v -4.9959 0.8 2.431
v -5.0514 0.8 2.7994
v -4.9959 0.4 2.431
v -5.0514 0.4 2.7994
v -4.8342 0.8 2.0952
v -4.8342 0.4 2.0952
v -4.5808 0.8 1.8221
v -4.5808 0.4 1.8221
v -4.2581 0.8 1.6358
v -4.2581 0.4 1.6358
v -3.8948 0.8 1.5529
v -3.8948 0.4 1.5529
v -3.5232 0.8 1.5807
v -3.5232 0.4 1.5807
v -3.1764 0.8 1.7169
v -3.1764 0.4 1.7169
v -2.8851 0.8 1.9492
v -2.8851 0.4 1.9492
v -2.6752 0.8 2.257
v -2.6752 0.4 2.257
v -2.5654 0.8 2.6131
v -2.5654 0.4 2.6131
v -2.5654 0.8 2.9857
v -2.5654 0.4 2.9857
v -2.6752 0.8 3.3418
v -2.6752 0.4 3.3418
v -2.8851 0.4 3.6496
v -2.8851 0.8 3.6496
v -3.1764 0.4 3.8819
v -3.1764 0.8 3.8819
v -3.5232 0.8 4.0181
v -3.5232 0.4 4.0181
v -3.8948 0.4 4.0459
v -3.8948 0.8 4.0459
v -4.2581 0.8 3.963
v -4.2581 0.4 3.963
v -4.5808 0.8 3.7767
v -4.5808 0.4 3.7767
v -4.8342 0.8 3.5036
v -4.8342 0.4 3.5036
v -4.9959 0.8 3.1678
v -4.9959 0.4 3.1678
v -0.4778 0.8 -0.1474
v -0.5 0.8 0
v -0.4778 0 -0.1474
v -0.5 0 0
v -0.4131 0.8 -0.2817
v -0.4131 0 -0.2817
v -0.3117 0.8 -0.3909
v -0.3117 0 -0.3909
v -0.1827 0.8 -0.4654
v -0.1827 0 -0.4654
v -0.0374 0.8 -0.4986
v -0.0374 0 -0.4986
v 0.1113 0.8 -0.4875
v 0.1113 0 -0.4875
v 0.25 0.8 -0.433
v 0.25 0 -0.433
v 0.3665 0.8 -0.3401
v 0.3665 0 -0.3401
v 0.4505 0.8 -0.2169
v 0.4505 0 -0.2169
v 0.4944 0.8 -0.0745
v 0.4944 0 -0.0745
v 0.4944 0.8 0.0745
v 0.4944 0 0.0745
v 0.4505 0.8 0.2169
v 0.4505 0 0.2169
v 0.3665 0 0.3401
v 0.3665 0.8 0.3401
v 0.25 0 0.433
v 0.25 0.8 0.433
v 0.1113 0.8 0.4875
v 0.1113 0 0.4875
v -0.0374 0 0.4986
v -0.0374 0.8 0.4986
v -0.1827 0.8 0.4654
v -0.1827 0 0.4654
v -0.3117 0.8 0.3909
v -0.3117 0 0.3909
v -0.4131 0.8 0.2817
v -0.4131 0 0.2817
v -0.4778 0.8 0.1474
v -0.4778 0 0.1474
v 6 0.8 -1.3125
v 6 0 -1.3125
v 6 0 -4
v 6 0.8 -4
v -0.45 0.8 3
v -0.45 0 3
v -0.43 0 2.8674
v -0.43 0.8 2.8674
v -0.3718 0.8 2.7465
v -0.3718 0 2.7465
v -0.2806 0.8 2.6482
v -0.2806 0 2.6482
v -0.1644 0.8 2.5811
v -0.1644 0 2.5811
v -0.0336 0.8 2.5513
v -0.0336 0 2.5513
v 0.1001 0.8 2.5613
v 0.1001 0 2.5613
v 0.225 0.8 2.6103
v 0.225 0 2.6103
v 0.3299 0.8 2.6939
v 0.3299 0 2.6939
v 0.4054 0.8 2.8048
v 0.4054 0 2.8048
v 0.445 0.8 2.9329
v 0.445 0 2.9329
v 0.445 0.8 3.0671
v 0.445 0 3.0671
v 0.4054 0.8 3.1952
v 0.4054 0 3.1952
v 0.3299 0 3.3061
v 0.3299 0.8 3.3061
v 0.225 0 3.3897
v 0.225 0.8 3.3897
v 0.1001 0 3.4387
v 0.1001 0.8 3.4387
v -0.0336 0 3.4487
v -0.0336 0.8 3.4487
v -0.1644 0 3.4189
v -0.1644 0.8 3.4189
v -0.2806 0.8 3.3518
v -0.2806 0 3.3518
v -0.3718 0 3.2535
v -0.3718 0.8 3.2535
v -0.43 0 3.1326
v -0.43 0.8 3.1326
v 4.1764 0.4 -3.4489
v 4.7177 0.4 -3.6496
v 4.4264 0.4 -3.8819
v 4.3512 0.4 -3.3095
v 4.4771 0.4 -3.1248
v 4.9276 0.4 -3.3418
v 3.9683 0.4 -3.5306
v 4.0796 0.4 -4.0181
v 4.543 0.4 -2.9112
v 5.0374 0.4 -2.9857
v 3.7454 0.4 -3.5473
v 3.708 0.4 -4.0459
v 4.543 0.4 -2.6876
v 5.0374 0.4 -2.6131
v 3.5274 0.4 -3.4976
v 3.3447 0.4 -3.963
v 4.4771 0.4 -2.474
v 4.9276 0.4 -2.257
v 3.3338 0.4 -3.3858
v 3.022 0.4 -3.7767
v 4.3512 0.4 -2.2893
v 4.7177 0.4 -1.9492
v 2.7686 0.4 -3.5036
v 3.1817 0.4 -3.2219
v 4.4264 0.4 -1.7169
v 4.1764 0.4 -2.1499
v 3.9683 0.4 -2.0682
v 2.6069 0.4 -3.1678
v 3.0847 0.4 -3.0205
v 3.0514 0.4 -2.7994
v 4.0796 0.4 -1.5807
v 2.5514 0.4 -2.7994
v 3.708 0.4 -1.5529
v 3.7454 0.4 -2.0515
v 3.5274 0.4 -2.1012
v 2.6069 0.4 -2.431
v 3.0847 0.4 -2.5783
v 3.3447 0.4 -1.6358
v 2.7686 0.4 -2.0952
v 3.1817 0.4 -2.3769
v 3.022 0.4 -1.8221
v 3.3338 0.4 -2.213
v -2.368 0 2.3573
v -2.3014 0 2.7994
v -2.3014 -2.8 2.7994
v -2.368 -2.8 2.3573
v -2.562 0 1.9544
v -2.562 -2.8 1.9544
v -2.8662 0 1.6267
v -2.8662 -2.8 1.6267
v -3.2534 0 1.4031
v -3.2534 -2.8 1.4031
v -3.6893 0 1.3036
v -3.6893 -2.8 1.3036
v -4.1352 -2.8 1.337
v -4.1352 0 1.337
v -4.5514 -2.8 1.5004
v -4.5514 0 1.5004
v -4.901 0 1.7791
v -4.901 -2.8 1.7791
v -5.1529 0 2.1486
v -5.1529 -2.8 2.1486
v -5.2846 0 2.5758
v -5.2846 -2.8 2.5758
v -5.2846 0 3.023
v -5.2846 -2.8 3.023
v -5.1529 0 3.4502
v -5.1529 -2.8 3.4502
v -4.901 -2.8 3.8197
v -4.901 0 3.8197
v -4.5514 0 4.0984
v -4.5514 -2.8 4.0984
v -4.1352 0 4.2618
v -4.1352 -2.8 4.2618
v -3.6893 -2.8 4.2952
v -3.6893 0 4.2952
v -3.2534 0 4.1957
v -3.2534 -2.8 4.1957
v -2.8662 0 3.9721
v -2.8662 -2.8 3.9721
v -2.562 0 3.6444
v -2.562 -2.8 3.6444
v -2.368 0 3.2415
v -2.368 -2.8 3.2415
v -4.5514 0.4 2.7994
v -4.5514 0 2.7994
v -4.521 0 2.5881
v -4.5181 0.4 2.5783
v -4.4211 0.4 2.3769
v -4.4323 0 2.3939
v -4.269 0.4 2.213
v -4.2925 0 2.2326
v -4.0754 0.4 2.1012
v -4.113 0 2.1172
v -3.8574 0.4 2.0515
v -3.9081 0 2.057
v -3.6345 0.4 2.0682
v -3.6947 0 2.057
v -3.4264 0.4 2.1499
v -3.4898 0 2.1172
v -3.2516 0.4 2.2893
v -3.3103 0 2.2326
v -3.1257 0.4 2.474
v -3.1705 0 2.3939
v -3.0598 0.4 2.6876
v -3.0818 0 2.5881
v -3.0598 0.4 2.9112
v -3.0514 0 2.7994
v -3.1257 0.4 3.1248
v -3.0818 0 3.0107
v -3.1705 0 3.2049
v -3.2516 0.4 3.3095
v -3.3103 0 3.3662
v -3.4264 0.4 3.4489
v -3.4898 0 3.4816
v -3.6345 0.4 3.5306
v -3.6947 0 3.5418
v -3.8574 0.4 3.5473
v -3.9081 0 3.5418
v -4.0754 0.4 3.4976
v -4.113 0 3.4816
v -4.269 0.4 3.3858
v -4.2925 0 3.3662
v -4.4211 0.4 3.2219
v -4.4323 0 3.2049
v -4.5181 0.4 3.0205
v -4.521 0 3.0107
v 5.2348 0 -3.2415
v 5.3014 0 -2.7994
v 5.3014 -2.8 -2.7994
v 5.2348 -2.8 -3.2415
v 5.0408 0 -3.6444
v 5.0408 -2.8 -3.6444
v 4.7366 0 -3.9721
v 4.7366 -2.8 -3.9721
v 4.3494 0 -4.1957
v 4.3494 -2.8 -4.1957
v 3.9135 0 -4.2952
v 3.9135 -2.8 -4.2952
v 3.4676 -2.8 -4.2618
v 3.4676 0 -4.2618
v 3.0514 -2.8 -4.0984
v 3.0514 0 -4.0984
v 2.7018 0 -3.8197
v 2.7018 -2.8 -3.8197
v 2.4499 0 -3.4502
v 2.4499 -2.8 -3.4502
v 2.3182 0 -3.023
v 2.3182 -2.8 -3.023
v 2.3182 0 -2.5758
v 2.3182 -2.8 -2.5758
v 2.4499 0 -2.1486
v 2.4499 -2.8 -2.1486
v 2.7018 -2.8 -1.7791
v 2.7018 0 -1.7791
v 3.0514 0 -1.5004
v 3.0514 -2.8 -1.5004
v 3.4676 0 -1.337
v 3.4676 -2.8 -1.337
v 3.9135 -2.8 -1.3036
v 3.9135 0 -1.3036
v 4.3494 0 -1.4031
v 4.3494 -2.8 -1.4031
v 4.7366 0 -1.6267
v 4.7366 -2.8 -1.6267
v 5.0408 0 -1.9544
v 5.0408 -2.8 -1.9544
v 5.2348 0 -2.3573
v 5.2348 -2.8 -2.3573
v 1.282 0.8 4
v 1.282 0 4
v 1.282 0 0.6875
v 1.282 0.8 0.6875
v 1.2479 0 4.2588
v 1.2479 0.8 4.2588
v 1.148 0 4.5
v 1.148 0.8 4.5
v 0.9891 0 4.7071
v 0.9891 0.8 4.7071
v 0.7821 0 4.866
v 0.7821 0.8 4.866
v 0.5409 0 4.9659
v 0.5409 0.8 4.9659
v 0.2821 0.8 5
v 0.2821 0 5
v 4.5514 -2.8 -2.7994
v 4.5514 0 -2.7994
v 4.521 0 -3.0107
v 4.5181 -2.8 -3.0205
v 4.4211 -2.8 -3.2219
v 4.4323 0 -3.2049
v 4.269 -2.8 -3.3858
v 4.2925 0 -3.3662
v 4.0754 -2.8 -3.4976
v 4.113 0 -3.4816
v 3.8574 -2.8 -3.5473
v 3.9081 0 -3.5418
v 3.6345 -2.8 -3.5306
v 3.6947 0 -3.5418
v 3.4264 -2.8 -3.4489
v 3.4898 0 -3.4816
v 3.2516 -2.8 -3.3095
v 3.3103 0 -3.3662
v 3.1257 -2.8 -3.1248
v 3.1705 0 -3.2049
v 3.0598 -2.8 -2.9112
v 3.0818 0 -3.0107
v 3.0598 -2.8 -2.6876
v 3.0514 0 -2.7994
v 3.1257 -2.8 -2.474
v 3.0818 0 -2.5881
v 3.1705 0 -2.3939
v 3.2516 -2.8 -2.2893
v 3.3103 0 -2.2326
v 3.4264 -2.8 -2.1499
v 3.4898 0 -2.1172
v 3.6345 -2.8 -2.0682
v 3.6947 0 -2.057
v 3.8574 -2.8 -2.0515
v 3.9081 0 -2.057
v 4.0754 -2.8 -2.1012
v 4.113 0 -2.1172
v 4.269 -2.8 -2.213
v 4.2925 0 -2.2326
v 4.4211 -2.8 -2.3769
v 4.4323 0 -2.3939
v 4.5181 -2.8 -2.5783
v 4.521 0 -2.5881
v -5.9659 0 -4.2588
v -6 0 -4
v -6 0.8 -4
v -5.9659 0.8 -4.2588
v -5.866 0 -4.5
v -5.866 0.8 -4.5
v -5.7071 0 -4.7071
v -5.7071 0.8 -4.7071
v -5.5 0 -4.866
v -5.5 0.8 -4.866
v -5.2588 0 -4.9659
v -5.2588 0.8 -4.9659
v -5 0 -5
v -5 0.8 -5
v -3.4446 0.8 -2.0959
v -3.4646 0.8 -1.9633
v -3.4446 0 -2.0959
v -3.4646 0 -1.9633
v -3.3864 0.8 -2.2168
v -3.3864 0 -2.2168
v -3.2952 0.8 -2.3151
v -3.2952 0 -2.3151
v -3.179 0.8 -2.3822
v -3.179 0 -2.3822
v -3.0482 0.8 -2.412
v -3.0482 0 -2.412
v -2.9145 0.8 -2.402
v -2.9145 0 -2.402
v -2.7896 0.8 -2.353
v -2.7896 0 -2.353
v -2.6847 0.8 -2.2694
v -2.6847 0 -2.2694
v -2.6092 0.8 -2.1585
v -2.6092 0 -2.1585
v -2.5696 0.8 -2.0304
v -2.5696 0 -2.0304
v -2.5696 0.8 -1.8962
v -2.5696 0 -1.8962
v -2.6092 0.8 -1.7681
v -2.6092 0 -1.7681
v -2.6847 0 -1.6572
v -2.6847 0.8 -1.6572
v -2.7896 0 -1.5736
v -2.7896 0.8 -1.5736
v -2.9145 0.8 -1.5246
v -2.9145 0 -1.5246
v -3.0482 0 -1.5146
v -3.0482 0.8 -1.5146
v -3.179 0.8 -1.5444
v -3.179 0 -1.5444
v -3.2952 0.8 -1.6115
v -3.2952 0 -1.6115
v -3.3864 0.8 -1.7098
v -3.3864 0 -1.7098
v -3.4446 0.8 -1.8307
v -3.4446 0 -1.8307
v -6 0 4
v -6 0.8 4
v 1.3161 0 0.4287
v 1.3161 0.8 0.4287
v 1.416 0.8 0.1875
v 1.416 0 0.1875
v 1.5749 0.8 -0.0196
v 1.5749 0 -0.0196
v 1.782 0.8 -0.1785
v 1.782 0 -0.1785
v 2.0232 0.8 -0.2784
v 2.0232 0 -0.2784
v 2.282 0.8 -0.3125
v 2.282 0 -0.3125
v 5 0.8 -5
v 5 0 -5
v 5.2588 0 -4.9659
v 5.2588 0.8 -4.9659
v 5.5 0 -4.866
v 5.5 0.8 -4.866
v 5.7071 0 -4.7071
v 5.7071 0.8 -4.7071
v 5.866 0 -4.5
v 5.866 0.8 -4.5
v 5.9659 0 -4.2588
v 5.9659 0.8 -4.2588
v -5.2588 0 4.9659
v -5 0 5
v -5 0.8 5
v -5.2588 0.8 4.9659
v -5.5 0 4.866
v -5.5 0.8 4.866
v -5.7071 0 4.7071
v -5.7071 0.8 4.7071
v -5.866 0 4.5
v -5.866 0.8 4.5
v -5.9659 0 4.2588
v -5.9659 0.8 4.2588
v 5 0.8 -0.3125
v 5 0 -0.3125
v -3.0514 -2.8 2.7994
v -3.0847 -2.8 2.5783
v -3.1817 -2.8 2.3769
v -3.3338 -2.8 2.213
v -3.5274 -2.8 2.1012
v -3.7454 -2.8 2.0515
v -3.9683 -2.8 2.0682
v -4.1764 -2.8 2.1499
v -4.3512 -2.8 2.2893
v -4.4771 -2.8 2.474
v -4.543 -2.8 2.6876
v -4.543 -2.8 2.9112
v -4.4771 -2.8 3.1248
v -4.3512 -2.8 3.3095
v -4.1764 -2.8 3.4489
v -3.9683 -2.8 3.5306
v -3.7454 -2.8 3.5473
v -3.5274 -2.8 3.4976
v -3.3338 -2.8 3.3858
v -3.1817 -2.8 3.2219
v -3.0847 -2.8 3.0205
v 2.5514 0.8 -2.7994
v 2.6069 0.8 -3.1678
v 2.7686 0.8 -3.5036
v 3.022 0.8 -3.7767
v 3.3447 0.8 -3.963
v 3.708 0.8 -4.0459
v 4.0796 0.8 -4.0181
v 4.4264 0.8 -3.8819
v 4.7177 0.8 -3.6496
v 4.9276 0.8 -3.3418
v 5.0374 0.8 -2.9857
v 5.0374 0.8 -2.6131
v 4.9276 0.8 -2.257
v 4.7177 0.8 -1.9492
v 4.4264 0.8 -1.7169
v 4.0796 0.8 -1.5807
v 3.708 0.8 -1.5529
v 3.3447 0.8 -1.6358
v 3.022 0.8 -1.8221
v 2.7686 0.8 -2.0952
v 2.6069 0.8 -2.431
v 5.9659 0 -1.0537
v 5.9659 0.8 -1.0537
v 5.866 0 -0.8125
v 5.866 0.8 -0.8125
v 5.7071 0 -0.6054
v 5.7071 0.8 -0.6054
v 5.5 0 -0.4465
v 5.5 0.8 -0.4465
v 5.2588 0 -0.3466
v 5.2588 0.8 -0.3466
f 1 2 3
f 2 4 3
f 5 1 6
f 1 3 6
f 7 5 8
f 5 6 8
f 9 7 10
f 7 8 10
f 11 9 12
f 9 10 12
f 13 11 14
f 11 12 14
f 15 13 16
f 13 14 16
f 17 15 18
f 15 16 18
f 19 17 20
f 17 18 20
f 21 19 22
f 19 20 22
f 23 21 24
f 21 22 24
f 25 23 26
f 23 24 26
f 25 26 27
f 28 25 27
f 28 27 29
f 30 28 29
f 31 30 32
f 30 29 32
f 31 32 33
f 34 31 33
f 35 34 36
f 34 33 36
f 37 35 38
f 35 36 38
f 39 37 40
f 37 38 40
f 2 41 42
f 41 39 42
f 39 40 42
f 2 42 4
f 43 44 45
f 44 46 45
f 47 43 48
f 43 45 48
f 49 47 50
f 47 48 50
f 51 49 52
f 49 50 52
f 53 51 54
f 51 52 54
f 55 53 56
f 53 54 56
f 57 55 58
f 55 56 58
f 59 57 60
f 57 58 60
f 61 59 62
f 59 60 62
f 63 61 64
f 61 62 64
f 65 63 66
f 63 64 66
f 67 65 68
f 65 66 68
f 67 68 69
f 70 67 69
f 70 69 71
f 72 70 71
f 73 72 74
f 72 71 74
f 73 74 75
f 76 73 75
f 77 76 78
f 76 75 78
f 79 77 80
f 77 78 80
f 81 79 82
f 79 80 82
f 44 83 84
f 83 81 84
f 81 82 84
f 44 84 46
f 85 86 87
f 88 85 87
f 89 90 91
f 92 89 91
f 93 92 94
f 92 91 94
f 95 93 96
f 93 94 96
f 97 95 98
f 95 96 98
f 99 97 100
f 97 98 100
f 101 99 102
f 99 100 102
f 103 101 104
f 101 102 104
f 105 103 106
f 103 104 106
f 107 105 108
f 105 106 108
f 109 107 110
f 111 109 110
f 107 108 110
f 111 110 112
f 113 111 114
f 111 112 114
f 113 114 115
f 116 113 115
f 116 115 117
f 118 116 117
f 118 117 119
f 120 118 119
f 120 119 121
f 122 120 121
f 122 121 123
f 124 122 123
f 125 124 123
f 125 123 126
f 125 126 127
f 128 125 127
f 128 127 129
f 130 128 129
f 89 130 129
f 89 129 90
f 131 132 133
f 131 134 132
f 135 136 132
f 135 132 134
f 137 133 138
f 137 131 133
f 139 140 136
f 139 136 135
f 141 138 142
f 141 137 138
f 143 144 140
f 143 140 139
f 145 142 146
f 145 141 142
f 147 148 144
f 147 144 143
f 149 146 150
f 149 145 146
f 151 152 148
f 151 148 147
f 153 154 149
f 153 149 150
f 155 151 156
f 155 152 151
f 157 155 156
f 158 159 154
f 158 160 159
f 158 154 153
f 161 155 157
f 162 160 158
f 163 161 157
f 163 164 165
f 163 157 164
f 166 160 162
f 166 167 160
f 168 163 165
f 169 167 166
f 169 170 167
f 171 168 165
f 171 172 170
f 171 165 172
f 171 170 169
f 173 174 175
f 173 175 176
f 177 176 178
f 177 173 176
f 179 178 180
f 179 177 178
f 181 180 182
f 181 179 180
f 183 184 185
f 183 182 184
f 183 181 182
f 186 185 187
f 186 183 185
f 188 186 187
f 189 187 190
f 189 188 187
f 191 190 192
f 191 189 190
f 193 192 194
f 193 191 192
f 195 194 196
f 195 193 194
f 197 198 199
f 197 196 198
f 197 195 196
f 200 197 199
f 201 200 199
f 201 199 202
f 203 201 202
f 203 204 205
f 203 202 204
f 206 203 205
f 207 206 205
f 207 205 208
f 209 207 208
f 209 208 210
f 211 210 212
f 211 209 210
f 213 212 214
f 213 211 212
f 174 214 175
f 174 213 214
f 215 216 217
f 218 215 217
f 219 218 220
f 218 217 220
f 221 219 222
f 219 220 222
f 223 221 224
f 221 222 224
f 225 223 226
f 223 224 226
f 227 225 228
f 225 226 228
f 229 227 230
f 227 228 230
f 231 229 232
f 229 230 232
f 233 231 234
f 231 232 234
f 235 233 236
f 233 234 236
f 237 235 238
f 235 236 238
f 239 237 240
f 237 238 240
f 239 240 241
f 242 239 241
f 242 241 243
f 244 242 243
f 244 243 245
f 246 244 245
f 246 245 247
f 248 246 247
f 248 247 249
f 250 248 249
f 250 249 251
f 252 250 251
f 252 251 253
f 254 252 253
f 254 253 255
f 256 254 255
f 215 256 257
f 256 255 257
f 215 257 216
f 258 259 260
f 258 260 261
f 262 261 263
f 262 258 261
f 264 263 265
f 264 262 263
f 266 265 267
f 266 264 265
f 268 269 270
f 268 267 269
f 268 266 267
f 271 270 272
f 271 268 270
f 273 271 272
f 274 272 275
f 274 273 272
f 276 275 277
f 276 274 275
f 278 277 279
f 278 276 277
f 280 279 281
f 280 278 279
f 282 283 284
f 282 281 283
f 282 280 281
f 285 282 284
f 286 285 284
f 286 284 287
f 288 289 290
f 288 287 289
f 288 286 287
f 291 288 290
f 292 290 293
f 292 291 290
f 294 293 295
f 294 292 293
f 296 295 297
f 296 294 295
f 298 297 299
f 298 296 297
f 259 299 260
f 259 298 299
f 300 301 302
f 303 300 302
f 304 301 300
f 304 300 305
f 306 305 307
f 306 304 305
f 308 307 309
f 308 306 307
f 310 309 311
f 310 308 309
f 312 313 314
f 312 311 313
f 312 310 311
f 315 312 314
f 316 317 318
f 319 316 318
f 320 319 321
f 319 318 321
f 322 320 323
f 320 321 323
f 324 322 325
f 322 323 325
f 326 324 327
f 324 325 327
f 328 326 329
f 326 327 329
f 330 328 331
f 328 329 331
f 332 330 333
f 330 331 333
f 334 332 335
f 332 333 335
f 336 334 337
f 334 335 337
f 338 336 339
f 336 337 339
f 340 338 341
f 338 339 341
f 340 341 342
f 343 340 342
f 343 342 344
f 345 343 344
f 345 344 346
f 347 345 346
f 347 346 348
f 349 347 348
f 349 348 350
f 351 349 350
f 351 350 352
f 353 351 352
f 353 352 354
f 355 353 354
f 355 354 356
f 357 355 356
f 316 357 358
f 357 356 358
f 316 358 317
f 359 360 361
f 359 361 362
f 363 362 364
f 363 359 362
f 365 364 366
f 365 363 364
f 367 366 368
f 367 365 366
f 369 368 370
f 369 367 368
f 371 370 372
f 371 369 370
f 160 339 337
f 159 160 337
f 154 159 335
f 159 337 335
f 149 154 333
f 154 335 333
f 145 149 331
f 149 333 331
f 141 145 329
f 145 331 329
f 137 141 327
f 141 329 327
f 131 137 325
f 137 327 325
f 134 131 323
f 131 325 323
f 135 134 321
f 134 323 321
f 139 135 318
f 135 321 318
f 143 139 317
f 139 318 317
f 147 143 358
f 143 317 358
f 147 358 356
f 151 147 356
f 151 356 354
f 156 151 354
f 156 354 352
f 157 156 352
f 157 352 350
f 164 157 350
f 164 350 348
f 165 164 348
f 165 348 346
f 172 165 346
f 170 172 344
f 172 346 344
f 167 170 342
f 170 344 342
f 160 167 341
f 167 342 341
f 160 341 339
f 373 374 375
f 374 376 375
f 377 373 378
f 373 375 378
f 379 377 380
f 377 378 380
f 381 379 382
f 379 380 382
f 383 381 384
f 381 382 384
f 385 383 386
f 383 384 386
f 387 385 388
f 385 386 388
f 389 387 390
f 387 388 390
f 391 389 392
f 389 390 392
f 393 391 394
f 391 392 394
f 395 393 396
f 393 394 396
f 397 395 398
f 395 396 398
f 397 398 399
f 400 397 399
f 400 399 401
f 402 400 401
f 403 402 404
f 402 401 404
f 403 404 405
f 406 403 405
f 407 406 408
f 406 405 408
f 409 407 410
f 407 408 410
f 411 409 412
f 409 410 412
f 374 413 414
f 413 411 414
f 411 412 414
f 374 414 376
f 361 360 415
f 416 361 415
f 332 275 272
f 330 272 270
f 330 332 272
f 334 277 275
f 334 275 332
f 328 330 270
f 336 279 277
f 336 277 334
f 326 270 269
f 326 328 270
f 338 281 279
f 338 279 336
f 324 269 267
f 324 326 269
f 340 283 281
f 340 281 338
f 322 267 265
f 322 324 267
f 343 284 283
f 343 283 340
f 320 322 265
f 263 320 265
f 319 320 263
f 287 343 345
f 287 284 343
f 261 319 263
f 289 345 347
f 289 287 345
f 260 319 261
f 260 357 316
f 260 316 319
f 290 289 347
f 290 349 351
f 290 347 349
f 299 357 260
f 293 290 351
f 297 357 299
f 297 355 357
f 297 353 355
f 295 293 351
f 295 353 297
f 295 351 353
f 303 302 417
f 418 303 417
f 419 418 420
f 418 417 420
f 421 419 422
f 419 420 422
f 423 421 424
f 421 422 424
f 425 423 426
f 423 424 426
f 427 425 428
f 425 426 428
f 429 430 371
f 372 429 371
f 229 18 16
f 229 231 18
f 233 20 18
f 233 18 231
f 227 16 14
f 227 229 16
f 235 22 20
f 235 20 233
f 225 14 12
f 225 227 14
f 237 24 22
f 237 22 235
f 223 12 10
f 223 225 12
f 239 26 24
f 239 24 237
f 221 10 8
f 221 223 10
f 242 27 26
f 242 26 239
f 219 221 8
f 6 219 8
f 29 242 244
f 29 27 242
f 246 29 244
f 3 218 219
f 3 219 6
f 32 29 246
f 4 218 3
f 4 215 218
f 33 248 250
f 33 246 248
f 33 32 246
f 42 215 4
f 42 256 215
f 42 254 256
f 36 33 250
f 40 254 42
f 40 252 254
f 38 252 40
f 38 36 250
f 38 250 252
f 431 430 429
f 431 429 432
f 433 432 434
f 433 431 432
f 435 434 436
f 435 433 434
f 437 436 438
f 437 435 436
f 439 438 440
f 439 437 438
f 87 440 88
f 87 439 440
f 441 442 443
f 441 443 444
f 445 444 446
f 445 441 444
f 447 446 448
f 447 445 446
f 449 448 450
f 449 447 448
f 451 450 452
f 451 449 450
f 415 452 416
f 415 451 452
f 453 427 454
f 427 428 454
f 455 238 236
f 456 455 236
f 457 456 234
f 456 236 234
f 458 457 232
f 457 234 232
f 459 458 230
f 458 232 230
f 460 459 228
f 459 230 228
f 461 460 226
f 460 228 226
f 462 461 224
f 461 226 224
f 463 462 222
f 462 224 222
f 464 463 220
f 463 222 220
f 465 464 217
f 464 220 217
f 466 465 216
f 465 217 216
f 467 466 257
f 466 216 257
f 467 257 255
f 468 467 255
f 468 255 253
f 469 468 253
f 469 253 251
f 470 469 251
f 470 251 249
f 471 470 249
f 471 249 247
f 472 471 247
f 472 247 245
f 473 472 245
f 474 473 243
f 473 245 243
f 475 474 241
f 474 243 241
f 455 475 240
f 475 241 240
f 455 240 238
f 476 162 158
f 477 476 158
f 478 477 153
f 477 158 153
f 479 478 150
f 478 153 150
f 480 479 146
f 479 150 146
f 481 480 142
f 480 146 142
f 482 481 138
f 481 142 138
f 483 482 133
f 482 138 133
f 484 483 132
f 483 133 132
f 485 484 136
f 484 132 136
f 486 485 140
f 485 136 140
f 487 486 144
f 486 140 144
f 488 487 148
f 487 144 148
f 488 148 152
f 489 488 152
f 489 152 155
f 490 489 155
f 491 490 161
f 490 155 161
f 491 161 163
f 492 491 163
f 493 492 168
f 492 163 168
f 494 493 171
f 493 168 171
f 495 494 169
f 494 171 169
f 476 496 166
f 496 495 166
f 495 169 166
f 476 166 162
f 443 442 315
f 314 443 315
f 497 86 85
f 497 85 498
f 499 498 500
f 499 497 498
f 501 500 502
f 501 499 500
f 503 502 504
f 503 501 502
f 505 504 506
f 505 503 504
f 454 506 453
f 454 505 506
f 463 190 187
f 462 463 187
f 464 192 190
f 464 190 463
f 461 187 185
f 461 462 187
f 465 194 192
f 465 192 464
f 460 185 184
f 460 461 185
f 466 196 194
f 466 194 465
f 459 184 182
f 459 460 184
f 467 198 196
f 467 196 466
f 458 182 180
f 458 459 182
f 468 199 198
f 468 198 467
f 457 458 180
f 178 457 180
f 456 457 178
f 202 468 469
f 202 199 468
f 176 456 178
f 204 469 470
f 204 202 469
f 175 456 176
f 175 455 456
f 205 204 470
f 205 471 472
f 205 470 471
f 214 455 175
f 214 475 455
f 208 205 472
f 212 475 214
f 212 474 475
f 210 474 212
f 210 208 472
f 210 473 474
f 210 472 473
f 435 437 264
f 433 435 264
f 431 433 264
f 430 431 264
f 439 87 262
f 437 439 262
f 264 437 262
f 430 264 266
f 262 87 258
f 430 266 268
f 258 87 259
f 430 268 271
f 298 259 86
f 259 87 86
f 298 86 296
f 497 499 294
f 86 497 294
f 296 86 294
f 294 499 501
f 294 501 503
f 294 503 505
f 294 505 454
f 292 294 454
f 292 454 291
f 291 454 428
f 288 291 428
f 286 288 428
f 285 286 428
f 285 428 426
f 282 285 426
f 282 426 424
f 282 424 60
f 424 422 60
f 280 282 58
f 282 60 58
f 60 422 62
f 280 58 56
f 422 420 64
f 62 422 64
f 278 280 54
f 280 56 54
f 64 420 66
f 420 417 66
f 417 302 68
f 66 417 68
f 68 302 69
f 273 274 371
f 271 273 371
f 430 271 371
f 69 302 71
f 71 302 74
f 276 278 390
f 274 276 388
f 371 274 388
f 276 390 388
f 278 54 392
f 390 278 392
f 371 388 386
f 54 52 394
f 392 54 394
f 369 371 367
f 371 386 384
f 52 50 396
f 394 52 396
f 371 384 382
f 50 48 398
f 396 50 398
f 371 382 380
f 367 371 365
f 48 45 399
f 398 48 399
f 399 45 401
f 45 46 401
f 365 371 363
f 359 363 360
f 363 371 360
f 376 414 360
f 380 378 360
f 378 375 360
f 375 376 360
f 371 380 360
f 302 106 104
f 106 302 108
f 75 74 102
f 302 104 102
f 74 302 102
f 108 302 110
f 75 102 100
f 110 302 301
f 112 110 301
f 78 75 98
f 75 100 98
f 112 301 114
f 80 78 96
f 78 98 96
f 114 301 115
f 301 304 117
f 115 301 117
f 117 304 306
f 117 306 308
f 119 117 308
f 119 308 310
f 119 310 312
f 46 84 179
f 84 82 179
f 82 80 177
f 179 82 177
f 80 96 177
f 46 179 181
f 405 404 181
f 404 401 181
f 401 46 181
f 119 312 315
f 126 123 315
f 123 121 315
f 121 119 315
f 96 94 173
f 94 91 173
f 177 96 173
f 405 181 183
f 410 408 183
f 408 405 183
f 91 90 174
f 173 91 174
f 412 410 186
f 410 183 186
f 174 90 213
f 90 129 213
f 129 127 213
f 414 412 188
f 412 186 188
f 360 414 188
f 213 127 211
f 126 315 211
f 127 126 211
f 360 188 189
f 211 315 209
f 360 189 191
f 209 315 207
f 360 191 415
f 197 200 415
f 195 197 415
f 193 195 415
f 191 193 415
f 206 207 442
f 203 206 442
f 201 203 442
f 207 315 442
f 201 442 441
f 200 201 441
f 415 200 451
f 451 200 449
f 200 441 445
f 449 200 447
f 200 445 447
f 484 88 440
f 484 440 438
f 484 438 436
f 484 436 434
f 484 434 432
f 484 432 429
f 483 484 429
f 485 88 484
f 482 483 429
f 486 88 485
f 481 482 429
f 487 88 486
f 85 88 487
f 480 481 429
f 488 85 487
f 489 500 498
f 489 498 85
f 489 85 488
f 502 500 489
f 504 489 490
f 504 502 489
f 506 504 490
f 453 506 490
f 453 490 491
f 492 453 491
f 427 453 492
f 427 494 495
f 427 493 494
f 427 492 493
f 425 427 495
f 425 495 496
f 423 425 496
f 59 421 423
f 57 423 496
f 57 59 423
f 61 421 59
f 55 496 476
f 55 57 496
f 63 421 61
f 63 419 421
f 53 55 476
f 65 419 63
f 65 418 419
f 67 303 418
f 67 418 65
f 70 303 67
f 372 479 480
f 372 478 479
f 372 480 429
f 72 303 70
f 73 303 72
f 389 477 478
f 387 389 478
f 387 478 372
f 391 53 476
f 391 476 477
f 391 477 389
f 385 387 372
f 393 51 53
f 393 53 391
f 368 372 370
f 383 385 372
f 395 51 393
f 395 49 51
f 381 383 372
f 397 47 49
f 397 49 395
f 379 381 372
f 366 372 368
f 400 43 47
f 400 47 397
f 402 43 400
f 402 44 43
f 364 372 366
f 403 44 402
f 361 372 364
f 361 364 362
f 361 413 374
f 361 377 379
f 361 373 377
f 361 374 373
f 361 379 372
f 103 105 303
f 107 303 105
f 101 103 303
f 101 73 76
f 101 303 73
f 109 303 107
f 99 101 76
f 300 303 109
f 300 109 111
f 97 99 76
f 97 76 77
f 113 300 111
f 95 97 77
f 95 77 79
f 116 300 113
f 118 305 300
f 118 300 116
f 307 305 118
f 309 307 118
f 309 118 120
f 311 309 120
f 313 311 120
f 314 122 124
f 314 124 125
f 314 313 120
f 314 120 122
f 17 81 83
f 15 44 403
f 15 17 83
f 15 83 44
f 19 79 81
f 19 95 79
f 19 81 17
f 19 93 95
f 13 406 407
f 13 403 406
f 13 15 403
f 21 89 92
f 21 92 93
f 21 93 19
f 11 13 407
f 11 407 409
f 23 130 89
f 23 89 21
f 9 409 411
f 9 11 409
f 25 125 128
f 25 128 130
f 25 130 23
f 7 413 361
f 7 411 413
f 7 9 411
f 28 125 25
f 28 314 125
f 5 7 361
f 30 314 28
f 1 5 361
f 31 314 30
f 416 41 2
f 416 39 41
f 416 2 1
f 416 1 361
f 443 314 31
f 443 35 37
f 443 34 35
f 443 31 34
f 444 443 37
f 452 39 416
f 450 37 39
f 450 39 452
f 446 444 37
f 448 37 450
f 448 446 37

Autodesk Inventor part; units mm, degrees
ref_plane "YZ Plane" through (0, 0, 0) normal (1, 0, 0) x (0, 1, 0)
ref_plane "XZ Plane" through (0, 0, 0) normal (0, 1, 0) x (-1, 0, 0)
ref_plane "XY Plane" through (0, 0, 0) normal (0, 0, 1) x (1, 0, 0)
sketch "Esboço1" plane through (0, 0, 0) normal (0, 1, 0) x (-1, 0, 0)
  arc A0 (-0.2821, 5) -> (-1.282, 4) centre (-0.282, 4) ccw
  line L0 (-1.282, 4) -> (-1.282, 0.6875)
  arc A1 (-2.282, -0.3125) -> (-1.282, 0.6875) centre (-2.282, 0.6875) ccw
  line L1 (-2.282, -0.3125) -> (-5, -0.3125)
  arc A2 (-5, -0.3125) -> (-6, -1.3125) centre (-5, -1.3125) ccw
  line L2 (-6, -1.3125) -> (-6, -4)
  arc A3 (-6, -4) -> (-5, -5) centre (-5, -4) ccw
  line L3 (-5, -5) -> (5, -5)
  arc A4 (5, -5) -> (6, -4) centre (5, -4) ccw
  line L4 (6, -4) -> (6, 4)
  arc A5 (6, 4) -> (5, 5) centre (5, 4) ccw
  line L5 (5, 5) -> (-0.2821, 5)
  circle A6 centre (3.0146, -1.9633) radius 0.45
  circle A7 centre (-3.8014, -2.7994) radius 1.25
  circle A8 centre (3.8014, 2.7994) radius 1.25
  circle A9 centre (3.8014, 2.7994) radius 1.25
  circle A10 centre (3.8014, 2.7994) radius 0.75
  circle A11 centre (-3.8014, -2.7994) radius 1.25
  circle A12 centre (-3.8014, -2.7994) radius 0.75
  circle A13 centre (0, 0) radius 0.5
  circle A14 centre (0, 3) radius 0.45
  dimension "d9" = 1
  dimension "d12" = 0.9
  dimension "d13" = 2
extrude "Extrusão1" add sketch "Esboço1" along normal blind 0.8 contours L5 A5 L4 A4 L3 A3 L2 A2 L1 A1 L0 A0 | A14
extrude "Extrusão2" add sketch "Esboço1" along normal blind 0.4 contours A7 | A8
sketch "Esboço2" plane through (0, 0, 0) normal (0, -1, 0) x (1, 0, 0)
  circle A0 centre (-3.8014, 2.7994) radius 0.75 projected
  circle A1 centre (-3.8014, 2.7994) radius 1.5
  circle A2 centre (3.8014, -2.7994) radius 0.75 projected
  circle A3 centre (3.8014, -2.7994) radius 1.5
  point P0 (0, 0)
  dimension "d4" = 3
  dimension "d5" = 3
extrude "Extrusão3" add sketch "Esboço2" along normal blind 2.8
extrude "Extrusão4" cut sketch "Esboço1" along normal blind 10 contours A14
properties part number "Chapa Intermediária"
